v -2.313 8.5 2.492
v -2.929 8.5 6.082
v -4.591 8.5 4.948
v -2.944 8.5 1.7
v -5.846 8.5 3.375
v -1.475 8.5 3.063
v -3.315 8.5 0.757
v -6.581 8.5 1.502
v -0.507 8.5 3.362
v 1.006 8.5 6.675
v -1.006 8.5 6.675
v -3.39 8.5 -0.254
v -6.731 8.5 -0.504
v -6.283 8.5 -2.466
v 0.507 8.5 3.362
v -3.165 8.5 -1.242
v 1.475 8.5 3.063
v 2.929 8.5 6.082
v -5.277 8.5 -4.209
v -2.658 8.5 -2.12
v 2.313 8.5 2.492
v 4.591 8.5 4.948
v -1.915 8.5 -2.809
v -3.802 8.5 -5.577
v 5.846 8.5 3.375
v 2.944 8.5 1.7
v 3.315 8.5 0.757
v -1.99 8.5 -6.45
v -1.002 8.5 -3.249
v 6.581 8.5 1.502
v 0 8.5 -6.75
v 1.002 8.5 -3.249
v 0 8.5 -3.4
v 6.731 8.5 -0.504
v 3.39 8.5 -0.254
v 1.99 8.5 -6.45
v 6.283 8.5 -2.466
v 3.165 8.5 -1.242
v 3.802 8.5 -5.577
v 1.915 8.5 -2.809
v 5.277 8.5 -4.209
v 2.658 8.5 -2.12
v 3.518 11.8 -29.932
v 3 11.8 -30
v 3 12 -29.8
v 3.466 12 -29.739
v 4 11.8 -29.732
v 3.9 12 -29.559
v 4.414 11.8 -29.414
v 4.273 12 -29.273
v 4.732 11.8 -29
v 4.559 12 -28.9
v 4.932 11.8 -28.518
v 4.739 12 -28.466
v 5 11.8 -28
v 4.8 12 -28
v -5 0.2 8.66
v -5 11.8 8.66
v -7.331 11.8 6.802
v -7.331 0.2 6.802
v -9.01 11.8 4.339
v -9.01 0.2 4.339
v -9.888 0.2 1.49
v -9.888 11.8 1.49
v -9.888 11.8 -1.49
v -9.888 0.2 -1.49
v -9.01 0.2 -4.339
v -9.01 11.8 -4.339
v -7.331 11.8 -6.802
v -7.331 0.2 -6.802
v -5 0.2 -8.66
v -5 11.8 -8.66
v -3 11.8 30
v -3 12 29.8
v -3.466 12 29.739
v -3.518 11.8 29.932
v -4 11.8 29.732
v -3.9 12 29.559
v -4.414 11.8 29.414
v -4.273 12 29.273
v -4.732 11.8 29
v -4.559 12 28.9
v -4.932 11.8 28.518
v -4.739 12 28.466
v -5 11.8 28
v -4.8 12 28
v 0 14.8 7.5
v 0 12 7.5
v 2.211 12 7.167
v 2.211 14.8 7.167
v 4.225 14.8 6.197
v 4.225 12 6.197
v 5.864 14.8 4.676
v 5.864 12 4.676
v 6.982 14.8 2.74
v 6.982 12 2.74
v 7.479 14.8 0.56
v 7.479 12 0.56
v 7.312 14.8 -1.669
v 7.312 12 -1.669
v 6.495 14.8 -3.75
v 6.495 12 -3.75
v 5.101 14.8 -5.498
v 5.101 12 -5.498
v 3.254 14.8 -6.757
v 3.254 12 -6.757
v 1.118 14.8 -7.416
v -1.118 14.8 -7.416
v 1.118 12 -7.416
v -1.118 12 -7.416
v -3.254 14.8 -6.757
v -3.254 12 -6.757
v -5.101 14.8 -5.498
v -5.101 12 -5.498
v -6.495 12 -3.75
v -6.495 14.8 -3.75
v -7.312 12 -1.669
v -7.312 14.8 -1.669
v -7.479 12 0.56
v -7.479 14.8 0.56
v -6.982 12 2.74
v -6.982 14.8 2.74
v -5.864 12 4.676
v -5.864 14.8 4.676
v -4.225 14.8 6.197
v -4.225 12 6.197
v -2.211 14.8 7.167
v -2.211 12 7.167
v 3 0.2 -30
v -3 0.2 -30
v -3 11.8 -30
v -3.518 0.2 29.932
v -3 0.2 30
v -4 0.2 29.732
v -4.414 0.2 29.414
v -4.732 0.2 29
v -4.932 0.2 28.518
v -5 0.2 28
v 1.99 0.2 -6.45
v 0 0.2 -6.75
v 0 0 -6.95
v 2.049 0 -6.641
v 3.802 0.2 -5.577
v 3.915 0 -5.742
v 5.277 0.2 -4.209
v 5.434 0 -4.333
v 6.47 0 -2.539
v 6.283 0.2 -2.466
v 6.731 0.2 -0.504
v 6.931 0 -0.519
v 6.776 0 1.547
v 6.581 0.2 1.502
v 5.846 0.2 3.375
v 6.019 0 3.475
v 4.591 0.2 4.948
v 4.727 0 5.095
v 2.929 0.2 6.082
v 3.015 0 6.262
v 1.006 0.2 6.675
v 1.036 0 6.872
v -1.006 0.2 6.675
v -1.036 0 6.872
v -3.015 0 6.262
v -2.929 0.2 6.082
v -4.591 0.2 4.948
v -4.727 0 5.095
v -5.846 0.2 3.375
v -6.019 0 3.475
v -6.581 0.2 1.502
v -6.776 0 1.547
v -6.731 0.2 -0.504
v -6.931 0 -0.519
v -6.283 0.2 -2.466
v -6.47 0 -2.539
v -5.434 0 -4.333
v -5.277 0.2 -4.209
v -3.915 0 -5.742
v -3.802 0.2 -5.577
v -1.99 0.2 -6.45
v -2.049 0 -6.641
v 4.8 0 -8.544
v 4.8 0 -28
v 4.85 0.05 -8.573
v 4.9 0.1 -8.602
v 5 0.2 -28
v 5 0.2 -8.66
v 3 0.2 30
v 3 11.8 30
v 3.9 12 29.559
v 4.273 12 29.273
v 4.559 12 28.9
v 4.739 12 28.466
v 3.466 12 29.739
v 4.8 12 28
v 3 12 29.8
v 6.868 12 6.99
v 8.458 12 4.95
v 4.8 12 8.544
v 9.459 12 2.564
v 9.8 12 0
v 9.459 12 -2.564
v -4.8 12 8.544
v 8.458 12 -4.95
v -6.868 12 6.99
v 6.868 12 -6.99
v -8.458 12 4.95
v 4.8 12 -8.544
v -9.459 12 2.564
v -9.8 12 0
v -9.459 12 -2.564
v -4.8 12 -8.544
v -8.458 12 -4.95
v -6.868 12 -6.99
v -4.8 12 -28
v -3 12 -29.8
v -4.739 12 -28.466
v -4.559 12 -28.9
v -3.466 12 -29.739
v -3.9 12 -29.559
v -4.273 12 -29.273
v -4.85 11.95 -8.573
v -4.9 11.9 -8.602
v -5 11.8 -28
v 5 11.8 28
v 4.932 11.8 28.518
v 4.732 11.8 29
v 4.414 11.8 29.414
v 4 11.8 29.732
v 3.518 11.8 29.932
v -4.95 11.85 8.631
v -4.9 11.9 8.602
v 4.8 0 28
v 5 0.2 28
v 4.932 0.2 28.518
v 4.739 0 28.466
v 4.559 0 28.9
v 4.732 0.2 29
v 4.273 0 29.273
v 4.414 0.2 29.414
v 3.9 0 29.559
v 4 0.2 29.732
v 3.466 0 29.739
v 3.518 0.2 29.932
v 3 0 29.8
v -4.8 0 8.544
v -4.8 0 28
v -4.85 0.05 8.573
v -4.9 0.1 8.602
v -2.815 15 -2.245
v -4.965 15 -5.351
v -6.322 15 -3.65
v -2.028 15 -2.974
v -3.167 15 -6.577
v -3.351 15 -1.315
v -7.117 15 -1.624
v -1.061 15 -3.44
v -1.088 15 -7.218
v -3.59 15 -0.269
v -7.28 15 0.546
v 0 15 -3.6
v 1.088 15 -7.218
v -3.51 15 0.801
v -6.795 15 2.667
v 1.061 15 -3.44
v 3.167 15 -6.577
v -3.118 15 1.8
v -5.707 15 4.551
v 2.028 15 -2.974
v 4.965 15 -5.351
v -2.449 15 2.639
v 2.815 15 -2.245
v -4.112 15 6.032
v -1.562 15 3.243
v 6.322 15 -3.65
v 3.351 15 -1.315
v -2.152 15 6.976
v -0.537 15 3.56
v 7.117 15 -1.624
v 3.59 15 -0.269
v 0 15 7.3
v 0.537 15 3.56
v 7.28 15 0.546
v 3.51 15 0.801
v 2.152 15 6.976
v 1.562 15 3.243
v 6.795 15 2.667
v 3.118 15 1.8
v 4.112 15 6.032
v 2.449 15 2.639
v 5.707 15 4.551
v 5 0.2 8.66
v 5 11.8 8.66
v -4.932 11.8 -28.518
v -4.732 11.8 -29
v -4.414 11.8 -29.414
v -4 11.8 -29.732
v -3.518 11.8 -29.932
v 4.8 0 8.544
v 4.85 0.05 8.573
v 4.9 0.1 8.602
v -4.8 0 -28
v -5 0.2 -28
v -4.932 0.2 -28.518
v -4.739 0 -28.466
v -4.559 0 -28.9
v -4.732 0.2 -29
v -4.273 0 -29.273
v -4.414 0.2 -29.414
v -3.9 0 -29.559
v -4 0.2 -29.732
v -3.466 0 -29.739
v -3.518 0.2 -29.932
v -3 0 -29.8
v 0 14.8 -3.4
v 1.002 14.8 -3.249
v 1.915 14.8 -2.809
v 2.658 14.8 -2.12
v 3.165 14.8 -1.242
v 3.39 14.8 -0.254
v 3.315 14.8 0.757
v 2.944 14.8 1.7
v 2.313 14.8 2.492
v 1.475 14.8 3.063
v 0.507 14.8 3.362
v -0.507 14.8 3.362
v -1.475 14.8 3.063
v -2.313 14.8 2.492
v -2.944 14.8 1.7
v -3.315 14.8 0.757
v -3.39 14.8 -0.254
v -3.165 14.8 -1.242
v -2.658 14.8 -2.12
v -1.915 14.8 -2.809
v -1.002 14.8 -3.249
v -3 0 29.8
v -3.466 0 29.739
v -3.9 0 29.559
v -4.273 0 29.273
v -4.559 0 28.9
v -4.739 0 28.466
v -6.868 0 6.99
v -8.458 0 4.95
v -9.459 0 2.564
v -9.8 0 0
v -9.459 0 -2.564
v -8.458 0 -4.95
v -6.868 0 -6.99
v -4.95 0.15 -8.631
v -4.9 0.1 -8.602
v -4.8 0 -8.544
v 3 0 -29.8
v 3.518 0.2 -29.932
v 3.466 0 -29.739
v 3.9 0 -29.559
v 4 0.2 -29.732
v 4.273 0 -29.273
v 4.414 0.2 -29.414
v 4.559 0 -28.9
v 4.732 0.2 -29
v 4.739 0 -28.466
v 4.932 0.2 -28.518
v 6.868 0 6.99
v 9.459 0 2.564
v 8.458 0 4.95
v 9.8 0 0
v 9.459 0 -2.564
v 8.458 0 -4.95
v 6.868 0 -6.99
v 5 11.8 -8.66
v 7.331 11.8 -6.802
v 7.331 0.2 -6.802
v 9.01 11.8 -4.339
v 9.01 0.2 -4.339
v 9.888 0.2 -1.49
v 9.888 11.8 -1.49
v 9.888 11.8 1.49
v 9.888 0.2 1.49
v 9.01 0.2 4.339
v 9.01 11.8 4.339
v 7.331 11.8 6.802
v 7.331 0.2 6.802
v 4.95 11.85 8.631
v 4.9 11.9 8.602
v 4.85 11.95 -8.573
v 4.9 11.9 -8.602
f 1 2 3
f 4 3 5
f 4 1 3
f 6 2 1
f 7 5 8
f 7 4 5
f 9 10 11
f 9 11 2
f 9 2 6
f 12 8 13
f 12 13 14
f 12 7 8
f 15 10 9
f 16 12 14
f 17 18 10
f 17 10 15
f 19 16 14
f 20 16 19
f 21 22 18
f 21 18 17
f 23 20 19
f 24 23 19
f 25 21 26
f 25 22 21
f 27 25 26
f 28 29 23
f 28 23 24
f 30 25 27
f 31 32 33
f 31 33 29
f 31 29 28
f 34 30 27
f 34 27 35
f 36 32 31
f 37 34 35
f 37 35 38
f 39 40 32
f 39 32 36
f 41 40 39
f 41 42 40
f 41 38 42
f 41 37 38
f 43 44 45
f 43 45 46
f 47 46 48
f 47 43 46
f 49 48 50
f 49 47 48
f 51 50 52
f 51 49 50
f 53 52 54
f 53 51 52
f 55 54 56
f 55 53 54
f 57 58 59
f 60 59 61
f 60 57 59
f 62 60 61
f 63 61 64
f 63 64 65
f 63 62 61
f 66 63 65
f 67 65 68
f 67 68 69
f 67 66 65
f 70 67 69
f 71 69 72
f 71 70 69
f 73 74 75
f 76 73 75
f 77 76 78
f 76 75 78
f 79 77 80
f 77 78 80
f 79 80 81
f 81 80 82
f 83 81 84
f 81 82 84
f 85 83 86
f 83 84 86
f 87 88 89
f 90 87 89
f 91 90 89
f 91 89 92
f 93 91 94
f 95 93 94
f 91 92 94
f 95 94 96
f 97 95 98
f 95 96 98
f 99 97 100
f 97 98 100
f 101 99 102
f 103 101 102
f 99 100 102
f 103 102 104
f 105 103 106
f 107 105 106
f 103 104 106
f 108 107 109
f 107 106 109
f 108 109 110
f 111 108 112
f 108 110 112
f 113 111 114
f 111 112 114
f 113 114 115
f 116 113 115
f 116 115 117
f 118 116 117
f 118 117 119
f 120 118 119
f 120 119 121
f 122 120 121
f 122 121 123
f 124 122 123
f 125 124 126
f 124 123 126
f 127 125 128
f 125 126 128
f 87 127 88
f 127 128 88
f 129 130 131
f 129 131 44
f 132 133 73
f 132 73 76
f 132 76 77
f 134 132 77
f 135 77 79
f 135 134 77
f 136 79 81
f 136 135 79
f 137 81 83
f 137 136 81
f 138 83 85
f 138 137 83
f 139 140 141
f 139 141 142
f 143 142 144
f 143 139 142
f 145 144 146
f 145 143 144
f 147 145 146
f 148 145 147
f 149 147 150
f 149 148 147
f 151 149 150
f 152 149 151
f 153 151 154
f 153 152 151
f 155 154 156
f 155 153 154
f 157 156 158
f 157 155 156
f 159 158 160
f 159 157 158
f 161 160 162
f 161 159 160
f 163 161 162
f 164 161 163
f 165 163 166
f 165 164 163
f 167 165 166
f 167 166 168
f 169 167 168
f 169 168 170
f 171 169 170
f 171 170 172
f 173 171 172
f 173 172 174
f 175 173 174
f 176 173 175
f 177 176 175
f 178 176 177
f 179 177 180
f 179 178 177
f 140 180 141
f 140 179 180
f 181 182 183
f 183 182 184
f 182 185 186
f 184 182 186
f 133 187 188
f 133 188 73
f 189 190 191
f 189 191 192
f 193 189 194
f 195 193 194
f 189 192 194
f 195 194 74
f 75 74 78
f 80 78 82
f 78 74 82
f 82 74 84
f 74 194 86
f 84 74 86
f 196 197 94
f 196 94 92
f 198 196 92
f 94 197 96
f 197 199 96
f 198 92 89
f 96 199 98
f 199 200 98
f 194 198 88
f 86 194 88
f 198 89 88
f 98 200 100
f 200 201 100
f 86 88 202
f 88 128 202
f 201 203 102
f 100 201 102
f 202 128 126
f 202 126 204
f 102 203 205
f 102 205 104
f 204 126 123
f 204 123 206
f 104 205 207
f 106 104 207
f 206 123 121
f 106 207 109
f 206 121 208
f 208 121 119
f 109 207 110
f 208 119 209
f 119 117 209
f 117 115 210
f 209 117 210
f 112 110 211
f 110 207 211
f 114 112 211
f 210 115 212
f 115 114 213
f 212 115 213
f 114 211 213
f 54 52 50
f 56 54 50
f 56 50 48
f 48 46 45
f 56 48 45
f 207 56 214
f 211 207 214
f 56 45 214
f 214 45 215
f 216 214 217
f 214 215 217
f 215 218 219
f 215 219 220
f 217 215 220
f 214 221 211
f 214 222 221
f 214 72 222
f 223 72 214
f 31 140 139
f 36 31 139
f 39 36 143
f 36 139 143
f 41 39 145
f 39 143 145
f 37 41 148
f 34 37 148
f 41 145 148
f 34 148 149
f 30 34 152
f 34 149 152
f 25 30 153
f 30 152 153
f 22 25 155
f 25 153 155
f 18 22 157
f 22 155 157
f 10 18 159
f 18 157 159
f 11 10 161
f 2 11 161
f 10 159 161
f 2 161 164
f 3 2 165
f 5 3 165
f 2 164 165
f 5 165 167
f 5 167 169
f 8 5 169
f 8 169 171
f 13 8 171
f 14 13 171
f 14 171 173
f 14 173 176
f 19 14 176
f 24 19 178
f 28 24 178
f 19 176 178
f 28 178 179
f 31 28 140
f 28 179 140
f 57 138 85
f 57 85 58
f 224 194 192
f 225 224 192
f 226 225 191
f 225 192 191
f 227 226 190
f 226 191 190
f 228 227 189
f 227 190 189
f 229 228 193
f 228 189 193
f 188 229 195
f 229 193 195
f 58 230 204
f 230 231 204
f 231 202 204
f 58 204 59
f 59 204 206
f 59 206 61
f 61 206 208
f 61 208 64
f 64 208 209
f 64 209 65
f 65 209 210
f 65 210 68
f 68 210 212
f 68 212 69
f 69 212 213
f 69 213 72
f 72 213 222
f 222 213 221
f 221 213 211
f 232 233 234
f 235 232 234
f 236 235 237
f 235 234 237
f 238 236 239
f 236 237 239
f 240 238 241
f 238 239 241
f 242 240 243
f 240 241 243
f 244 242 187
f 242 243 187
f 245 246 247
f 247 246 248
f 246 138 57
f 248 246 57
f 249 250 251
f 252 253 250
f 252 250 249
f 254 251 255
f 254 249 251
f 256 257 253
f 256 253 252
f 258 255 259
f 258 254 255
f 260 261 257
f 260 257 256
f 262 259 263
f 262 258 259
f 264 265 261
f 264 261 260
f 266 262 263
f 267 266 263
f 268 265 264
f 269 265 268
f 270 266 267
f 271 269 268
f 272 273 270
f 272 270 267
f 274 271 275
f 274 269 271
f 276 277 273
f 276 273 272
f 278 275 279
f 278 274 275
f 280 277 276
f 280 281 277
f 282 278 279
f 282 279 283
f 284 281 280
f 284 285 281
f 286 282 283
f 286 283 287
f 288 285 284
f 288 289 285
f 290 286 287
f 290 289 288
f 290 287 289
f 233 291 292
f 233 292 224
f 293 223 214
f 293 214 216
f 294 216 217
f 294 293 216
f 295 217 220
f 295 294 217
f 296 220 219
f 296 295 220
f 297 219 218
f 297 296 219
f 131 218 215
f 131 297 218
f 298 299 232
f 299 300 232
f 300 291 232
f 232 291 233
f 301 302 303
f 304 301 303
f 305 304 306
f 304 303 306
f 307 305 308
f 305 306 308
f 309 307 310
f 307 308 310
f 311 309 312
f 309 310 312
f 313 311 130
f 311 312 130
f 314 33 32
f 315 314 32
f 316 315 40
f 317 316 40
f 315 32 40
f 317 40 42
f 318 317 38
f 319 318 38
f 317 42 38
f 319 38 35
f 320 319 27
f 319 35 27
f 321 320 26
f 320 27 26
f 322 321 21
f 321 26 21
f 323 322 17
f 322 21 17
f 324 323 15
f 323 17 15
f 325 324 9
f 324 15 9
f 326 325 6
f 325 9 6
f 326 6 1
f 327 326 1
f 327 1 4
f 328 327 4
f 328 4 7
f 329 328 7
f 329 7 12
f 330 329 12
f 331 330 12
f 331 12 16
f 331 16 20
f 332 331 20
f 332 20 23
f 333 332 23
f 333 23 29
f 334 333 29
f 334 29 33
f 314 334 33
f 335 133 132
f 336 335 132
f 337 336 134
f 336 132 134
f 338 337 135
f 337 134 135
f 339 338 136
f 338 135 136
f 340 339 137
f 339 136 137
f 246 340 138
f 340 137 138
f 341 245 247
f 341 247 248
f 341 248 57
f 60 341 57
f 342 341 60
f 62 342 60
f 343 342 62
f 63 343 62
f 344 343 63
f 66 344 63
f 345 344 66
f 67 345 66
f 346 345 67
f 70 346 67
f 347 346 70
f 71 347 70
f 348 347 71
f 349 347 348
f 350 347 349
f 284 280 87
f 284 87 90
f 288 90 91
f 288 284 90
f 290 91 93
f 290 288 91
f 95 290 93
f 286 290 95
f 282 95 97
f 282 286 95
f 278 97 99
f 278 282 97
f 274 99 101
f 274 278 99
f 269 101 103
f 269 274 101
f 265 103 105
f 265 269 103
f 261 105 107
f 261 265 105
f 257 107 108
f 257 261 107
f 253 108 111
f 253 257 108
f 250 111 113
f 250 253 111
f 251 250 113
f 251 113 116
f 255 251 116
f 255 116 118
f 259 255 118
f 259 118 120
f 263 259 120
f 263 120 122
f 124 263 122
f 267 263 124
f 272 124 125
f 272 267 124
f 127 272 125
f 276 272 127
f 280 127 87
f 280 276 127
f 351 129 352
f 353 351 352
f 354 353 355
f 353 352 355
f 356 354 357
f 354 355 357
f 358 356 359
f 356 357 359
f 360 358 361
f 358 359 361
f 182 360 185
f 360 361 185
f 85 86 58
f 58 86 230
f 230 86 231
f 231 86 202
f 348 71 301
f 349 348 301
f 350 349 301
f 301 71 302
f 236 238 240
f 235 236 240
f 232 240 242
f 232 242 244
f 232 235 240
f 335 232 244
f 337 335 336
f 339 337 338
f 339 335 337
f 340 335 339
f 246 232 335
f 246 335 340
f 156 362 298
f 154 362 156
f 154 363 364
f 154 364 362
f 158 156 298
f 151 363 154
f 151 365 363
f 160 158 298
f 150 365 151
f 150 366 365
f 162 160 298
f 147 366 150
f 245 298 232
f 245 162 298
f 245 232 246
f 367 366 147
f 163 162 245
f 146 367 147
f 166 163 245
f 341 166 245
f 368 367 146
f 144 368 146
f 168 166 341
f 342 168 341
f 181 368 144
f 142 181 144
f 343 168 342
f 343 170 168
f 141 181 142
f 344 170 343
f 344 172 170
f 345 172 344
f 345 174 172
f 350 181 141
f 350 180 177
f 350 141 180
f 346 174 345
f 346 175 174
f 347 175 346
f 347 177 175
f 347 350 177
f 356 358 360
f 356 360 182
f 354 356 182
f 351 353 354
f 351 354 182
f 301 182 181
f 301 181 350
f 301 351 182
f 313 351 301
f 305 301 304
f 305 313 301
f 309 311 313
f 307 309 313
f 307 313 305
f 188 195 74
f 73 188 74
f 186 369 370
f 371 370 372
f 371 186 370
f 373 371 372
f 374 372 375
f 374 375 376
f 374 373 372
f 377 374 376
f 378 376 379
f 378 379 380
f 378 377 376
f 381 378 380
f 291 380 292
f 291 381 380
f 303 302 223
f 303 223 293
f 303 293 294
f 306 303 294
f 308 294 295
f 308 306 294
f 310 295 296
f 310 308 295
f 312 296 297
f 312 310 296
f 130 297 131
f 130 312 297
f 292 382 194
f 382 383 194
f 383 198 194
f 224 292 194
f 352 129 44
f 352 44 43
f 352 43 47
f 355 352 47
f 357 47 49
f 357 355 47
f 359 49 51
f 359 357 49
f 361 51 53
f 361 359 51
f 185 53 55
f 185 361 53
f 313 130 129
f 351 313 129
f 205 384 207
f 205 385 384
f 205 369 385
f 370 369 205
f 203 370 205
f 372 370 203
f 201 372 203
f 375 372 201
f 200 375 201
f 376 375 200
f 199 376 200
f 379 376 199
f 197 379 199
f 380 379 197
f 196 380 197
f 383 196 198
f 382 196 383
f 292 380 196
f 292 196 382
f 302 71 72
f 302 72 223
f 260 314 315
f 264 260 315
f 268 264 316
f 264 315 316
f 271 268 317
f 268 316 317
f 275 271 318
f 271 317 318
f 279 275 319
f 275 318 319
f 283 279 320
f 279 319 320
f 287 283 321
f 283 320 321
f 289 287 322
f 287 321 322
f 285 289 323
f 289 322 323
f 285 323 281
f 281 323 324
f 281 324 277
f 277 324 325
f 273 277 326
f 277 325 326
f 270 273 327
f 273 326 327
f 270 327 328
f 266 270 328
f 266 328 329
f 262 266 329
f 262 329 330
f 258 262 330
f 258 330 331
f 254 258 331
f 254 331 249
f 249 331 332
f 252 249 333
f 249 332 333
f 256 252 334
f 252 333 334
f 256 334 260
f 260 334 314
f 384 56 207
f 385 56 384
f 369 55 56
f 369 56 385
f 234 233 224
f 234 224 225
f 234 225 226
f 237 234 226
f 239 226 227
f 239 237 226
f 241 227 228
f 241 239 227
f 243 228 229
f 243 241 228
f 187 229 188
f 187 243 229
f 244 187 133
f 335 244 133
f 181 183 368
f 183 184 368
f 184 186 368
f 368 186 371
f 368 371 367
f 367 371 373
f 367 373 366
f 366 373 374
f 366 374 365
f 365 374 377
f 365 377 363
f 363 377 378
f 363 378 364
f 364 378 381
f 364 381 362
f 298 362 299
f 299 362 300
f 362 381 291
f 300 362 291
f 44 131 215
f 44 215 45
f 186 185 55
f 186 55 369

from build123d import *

# Parameters (mm, degrees)
BOSS_EXTRUDE1_DEPTH = 12
SKETCH_2_R          = 6.75
CUT_EXTRUDE1_DEPTH  = 8.5
SKETCH_4_R          = 7.5
BOSS_EXTRUDE2_DEPTH = 3
SKETCH_3_R          = 3.4
CUT_EXTRUDE2_DEPTH  = 33.74522866
FILLET1_SIZE        = 0.2


with BuildPart() as part:
    # 草图1 → Boss-Extrude1 (new body)
    with BuildSketch(Plane(origin=(0, 0, 0), x_dir=(1, 0, 0), z_dir=(0, 1, 0))):
        with BuildLine():
            Line((-5, -28), (-5, -8.660254038))
            ThreePointArc((-5, -8.660254038), (-10, 0), (-5, 8.660254038))
            Line((-5, 8.660254038), (-5, 28))
            ThreePointArc((-5, 28), (-4.414213562, 29.414213562), (-3, 30))
            Line((-3, 30), (3, 30))
            ThreePointArc((3, 30), (4.414213562, 29.414213562), (5, 28))
            Line((5, 28), (5, 8.660254038))
            ThreePointArc((5, 8.660254038), (10, 0), (5, -8.660254038))
            Line((5, -8.660254038), (5, -28))
            ThreePointArc((5, -28), (4.414213562, -29.414213562), (3, -30))
            Line((3, -30), (-3, -30))
            ThreePointArc((-3, -30), (-4.414213562, -29.414213562), (-5, -28))
        make_face()
    extrude(amount=BOSS_EXTRUDE1_DEPTH)

    # 草图2 → Cut-Extrude1 (cut)
    with BuildSketch(Plane.XZ):
        with Locations(Location((0, 0, 0), (0, 0, 270))):
            Circle(SKETCH_2_R)
    extrude(amount=-CUT_EXTRUDE1_DEPTH, mode=Mode.SUBTRACT)

    # 草图4 → Boss-Extrude2 (add)
    with BuildSketch(Plane(origin=(0, 12, 0), x_dir=(1, 0, 0), z_dir=(0, 1, 0))):
        with Locations(Location((0, 0, 0), (0, 0, 270))):
            Circle(SKETCH_4_R)
    extrude(amount=BOSS_EXTRUDE2_DEPTH)

    # 草图3 → Cut-Extrude2 (cut, through all)
    with BuildSketch(Plane.XZ.offset(-8.5)):
        with Locations(Location((0, 0, 0), (0, 0, 270))):
            Circle(SKETCH_3_R)
    extrude(amount=-CUT_EXTRUDE2_DEPTH, mode=Mode.SUBTRACT)

    # Fillet1
    fillet1_edges = [part.edges().sort_by_distance(p)[0] for p in [
        (5, 0, 18.330127019),
        (4.414213562, 0, 29.414213562),
        (4.414213562, 12, -29.414213562),
        (0, 0, 30),
        (-4.414213562, 0, 29.414213562),
        (-5, 0, 18.330127019),
        (-10, 0, 0),
        (-5, 0, -18.330127019),
        (-4.414213562, 0, -29.414213562),
        (0, 0, -30),
        (4.414213562, 0, -29.414213562),
        (5, 0, -18.330127019),
        (10, 0, 0),
        (0, 12, -30),
        (-4.414213562, 12, -29.414213562),
        (-5, 12, -18.330127019),
        (-10, 12, 0),
        (-5, 12, 18.330127019),
        (-4.414213562, 12, 29.414213562),
        (0, 0, 6.75),
        (0, 12, 30),
        (0, 15, -7.5),
        (4.414213562, 12, 29.414213562),
        (0, 15, 3.4),
        (5, 12, 18.330127019),
        (10, 12, 0),
        (5, 12, -18.330127019),
    ]]
    chamfer(fillet1_edges, length=FILLET1_SIZE)


solid = part.part
